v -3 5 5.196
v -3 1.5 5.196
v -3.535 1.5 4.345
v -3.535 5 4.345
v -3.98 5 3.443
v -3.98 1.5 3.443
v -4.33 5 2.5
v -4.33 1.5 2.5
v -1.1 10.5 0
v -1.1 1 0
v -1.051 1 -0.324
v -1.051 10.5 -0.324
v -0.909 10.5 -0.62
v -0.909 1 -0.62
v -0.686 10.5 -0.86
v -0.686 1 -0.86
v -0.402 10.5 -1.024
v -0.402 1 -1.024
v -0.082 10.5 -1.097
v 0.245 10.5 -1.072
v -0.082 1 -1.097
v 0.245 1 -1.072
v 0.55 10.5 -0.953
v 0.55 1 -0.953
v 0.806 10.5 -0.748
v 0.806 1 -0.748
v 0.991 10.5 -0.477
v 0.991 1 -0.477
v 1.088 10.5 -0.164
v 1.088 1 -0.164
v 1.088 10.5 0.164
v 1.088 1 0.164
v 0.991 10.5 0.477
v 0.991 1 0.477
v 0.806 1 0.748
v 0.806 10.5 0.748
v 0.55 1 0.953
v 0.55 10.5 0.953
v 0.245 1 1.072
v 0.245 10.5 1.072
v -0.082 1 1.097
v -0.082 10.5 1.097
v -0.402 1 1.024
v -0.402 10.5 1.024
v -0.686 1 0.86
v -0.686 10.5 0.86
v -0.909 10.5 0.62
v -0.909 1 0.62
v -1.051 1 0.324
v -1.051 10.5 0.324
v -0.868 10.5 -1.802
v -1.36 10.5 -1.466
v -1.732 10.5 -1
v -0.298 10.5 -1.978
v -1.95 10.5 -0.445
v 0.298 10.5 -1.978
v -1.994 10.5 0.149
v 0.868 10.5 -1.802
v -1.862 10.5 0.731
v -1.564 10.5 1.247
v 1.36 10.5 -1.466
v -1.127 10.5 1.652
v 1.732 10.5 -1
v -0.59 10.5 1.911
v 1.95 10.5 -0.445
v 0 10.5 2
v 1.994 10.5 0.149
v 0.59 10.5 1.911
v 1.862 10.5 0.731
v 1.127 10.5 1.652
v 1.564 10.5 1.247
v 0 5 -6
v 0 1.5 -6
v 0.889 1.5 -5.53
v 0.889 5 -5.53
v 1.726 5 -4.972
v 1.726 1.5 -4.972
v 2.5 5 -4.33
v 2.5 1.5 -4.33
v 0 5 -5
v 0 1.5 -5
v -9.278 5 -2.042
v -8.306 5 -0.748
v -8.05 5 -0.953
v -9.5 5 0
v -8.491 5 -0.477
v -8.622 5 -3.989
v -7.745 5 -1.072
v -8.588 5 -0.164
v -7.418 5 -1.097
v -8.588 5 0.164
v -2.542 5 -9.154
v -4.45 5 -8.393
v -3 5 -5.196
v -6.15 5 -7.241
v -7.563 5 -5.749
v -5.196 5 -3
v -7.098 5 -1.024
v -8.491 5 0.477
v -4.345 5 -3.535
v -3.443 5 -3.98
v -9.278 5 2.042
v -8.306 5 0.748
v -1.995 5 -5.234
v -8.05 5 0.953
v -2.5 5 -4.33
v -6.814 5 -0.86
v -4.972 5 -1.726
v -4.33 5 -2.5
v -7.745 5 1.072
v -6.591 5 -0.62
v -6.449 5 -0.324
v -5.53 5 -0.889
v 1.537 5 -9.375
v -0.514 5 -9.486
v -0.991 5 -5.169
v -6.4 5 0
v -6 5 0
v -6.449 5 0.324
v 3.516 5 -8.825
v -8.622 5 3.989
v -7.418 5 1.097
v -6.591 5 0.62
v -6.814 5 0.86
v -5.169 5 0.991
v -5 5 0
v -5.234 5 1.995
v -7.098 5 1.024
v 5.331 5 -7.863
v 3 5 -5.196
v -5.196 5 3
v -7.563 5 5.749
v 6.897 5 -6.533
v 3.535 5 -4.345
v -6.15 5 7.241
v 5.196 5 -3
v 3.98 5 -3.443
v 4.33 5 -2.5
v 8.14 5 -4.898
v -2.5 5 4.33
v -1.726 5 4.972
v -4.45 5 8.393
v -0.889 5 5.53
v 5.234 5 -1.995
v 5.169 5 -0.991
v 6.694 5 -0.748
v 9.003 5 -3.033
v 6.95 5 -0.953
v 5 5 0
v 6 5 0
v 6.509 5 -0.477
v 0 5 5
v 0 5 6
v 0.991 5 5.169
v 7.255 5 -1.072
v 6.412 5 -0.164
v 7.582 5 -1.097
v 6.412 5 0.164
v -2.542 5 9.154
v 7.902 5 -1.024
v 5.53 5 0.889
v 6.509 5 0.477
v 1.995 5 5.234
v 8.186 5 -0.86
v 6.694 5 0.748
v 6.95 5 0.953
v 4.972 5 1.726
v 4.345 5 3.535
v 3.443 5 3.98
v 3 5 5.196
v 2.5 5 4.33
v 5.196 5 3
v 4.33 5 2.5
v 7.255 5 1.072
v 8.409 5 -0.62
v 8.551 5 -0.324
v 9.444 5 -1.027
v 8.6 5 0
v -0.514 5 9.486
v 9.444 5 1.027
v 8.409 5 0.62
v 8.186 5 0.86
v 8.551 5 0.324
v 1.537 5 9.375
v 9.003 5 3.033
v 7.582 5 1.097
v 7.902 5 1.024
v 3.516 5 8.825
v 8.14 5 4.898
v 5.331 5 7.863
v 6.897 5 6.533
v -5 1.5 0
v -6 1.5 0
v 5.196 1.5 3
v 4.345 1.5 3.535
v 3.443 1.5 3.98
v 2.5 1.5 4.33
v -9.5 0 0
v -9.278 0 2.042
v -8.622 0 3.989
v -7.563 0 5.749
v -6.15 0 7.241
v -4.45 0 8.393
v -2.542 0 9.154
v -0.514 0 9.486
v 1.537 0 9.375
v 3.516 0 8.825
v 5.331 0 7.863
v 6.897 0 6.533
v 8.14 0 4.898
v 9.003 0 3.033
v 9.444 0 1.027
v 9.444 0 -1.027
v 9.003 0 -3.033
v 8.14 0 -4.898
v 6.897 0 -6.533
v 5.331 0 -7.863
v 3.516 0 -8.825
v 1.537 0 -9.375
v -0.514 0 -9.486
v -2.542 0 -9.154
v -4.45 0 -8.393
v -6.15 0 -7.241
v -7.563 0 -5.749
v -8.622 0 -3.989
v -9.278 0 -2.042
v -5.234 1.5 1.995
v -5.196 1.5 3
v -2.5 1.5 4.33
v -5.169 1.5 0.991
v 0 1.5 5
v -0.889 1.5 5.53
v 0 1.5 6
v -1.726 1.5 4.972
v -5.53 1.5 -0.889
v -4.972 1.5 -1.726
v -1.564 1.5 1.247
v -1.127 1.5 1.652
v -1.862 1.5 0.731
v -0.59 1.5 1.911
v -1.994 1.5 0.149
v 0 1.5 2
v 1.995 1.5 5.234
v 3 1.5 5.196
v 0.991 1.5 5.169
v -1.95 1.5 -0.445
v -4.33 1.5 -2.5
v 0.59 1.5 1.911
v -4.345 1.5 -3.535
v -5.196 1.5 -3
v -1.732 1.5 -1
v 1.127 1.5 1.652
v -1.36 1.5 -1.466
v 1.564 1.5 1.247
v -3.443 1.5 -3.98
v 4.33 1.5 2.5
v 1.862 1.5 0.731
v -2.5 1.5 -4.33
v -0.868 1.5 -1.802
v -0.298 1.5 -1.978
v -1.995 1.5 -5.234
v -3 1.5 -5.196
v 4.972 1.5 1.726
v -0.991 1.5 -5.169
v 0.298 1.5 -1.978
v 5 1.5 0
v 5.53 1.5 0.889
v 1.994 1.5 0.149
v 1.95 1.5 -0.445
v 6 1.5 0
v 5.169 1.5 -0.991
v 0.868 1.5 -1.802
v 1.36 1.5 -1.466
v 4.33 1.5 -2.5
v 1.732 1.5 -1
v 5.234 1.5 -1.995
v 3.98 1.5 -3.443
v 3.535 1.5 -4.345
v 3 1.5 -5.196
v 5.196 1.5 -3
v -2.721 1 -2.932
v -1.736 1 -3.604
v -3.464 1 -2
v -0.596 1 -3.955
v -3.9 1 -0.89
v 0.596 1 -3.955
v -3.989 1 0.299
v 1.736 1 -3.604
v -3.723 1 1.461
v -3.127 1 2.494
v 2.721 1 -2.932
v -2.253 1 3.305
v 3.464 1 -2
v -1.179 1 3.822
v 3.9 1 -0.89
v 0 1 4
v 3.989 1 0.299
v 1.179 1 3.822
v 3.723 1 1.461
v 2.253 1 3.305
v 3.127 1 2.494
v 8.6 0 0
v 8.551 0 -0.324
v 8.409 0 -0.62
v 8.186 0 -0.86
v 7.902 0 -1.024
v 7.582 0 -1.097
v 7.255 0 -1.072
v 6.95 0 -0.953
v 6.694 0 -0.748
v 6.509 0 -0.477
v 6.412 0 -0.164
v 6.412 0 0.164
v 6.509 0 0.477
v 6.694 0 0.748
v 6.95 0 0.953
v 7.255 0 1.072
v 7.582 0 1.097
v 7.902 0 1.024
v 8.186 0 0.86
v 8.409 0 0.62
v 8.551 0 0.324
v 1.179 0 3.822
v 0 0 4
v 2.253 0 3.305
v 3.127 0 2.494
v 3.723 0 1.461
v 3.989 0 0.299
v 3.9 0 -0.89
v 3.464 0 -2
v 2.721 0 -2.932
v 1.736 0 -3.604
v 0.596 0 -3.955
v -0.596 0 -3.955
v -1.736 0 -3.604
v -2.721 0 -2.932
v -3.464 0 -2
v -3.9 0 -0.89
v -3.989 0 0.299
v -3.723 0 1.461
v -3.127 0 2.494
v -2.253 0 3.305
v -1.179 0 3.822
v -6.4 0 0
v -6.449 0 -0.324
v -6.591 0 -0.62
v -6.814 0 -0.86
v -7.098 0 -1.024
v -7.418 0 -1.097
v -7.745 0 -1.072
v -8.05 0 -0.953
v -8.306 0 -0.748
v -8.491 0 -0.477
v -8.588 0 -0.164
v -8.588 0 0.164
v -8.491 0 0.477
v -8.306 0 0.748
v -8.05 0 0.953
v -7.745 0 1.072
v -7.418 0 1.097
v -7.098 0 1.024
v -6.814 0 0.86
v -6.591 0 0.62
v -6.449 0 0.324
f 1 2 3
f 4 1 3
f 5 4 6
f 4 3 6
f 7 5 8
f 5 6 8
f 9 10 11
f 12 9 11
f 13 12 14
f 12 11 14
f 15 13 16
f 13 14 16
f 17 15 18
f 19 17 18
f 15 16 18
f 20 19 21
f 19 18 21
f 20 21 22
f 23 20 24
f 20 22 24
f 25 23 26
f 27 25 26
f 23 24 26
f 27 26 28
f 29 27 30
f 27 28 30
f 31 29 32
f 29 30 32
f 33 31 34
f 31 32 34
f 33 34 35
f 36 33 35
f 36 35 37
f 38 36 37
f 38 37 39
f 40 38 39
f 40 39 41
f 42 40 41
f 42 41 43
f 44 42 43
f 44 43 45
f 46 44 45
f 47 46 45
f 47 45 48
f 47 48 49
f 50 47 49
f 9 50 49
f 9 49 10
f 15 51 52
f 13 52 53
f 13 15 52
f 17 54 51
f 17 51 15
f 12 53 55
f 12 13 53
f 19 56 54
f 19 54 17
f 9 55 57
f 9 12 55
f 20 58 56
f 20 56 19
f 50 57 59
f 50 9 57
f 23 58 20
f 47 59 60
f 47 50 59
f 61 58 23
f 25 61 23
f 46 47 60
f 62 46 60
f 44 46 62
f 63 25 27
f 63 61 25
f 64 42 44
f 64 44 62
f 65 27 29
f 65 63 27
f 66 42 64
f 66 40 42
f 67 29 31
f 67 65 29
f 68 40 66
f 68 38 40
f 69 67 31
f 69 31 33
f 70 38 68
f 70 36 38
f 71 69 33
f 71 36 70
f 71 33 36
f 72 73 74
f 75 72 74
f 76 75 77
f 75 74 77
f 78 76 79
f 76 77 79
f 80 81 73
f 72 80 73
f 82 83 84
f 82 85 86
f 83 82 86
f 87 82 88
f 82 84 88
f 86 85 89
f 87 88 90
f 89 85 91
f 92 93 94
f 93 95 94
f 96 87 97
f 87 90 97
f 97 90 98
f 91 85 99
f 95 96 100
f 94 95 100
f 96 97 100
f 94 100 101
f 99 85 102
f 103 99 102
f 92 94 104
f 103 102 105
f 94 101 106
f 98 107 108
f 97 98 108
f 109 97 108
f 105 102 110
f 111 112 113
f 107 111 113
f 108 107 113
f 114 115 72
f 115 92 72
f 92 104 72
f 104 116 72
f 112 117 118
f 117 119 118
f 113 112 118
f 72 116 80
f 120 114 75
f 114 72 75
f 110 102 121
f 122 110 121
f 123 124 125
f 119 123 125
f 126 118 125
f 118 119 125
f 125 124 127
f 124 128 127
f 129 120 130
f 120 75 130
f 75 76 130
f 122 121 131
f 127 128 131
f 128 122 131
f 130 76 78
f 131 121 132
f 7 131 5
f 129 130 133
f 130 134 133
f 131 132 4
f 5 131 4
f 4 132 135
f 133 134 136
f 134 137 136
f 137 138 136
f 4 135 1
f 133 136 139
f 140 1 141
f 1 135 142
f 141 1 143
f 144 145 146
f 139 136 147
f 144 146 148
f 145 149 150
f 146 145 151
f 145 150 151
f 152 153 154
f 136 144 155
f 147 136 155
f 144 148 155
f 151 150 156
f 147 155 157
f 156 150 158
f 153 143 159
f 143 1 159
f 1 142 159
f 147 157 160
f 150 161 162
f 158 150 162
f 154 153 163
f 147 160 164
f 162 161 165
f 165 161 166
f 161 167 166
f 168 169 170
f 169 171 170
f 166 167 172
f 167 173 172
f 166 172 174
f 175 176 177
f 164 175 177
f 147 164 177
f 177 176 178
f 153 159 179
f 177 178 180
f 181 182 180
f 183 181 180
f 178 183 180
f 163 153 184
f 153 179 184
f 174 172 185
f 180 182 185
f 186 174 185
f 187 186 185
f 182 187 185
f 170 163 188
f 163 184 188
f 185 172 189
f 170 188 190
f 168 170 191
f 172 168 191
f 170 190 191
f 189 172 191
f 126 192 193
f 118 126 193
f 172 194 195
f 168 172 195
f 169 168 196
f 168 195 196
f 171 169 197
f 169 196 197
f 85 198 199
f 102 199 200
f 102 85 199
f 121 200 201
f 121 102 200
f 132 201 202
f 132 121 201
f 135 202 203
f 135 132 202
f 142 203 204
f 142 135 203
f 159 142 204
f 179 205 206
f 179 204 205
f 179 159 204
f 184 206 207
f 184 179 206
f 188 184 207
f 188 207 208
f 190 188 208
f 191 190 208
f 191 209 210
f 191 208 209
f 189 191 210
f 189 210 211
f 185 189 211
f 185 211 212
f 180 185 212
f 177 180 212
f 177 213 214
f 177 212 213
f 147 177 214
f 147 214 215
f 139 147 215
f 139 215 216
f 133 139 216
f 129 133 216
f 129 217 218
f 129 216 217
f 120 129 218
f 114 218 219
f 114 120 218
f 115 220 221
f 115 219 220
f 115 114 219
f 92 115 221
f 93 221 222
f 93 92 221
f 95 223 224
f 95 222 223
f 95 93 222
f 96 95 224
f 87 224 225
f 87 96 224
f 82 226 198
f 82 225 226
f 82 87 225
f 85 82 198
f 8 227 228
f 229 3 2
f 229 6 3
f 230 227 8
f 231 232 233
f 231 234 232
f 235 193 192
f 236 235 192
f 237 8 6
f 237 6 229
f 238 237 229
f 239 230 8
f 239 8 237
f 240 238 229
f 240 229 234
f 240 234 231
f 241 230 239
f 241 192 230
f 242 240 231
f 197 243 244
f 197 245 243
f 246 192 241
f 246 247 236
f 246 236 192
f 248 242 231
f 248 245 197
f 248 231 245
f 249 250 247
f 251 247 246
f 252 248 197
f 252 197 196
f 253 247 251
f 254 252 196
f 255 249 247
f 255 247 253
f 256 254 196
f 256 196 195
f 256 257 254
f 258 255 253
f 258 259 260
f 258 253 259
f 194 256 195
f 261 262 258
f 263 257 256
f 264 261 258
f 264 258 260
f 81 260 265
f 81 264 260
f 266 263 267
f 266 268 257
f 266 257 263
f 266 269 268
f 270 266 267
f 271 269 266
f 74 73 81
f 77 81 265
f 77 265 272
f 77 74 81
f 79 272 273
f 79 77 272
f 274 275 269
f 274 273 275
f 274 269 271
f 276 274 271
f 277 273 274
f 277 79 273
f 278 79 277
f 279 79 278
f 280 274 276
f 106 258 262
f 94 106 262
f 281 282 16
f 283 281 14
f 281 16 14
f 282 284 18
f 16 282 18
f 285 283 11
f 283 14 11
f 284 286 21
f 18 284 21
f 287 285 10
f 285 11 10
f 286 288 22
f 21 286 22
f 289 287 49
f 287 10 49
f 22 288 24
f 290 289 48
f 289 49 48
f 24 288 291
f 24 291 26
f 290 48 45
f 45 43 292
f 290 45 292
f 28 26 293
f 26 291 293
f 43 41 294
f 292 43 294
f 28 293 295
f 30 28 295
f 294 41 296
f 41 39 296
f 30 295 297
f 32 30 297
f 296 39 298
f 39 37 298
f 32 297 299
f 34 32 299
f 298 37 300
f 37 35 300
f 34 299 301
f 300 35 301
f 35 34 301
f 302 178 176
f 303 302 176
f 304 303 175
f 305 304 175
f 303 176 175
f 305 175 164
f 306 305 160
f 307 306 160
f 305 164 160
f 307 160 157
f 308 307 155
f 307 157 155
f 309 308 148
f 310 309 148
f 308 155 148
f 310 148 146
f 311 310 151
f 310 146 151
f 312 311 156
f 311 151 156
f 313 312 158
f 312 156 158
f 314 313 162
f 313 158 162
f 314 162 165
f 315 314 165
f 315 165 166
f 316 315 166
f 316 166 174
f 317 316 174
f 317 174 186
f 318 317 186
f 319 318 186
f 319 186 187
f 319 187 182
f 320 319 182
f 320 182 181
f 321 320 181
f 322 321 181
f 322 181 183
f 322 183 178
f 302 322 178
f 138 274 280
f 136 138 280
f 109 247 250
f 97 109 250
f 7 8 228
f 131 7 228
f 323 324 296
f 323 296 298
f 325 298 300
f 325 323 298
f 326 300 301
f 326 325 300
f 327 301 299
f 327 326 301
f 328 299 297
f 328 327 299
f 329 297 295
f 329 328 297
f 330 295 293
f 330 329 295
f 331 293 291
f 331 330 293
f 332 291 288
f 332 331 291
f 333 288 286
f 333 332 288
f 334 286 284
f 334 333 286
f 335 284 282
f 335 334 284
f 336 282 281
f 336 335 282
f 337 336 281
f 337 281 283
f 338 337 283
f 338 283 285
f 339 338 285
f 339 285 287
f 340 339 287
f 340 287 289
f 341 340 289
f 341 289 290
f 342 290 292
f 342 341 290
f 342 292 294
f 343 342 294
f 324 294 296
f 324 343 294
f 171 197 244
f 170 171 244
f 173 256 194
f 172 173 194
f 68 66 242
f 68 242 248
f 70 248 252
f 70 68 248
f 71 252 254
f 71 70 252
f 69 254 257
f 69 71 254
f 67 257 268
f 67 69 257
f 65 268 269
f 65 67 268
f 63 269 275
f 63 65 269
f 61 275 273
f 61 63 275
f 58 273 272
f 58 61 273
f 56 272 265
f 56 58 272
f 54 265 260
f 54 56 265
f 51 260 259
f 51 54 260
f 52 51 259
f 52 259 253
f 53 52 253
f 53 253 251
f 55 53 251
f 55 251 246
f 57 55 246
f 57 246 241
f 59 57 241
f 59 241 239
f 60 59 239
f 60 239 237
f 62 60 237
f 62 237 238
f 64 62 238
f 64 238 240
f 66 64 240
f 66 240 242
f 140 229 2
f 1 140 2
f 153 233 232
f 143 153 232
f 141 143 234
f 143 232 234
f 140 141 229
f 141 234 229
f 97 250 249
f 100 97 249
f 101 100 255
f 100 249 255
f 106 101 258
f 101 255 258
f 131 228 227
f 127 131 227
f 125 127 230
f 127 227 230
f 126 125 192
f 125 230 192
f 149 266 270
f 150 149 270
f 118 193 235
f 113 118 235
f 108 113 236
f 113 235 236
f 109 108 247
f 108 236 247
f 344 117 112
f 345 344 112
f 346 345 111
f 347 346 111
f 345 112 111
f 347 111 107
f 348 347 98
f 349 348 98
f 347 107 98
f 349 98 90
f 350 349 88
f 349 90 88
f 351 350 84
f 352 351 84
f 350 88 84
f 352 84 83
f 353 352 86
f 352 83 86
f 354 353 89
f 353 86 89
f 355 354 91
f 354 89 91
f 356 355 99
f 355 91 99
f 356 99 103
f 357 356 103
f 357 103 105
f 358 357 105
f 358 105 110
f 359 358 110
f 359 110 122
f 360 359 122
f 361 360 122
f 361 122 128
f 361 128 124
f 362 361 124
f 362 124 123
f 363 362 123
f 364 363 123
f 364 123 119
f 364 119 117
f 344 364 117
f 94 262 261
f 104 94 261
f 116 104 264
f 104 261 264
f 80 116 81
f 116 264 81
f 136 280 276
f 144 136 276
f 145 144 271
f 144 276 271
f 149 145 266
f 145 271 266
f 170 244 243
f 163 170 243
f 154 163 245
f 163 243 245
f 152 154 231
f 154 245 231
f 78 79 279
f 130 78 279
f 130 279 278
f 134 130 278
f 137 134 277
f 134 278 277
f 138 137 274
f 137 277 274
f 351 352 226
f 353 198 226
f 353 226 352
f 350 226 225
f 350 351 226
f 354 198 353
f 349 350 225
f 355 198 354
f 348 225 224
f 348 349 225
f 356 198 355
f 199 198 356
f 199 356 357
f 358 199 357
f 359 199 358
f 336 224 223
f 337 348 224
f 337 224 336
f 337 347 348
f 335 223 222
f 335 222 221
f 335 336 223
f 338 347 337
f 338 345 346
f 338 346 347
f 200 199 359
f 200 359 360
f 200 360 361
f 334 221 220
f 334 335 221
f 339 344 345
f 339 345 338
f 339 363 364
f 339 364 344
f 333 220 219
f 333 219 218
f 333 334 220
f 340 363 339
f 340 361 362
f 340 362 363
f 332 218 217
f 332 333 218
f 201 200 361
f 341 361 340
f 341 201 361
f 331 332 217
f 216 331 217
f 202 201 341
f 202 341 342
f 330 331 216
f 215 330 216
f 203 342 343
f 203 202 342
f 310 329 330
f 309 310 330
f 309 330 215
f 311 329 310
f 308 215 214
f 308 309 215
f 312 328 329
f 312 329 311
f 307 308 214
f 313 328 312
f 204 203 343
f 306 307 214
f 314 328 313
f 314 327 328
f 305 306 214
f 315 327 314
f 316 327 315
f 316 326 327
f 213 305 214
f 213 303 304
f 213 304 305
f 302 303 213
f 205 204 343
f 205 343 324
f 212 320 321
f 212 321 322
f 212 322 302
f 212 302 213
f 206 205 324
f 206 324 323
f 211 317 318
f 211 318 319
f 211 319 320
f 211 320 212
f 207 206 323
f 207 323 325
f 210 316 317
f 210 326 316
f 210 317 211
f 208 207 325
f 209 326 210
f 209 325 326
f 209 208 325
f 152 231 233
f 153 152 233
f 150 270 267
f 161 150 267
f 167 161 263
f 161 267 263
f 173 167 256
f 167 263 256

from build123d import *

# Parameters (mm, degrees)
SIDE_PROFILE_RATCHETING_PULLEY_MASTERMOD_W = 7.5
SIDE_PROFILE_RATCHETING_PULLEY_MASTERMOD_H = 5
RATCHETING_START                           = 1.5
RATCHETING_PULLEY_MASTERMODEL_OUTLINE_R    = 6
RATCHETING_PULLEY_MASTERMODEL_OUTLINE_R_2  = 2
RATCHETING_PULLEY_MASTERMODEL_DEPTH        = 3.5
M2_CLEARANCE_HOLE2_D                       = 2.2
BOSS_EXTRUDE2_DEPTH                        = 5
BOSS_EXTRUDE1_START                        = 10.5
BOTTOM_PULLEY_RATCHETING_PULLEY_MASTERMO_R = 2
BOSS_EXTRUDE1_DEPTH                        = 10.5
M2_CLEARANCE_HOLE3_D                       = 2.2
BOTTOM_PULLEY_RATCHETING_PULLEY_MAST_2_R   = 4
CUT_EXTRUDE3_DEPTH                         = 1


# Read off the part's stored shape, not the designer's step: ratcheting pulley mastermodel
with BuildPart() as part:
    # side profile-ratcheting pulley mastermod → Revolve1 (revolve)
    with BuildSketch(Plane.XY, mode=Mode.PRIVATE) as revolve1_sk:
        with Locations((-5.75, 2.5)):
            Rectangle(SIDE_PROFILE_RATCHETING_PULLEY_MASTERMOD_W, SIDE_PROFILE_RATCHETING_PULLEY_MASTERMOD_H)
        with Locations((5.75, 2.5)):
            Rectangle(SIDE_PROFILE_RATCHETING_PULLEY_MASTERMOD_W, SIDE_PROFILE_RATCHETING_PULLEY_MASTERMOD_H)
    revolve(revolve1_sk.sketch.rotate(Axis((0, 0, 0), (0, 1, 0)), 180), axis=Axis((0, 0, 0), (0, 1, 0)))

    # ratcheting pulley mastermodel outline → ratcheting pulley mastermodel (cut)
    with BuildSketch(Plane(origin=(0, 0, 0), x_dir=(1, 0, 0), z_dir=(0, 1, 0)).offset(RATCHETING_START)):
        Circle(RATCHETING_PULLEY_MASTERMODEL_OUTLINE_R)
        Circle(RATCHETING_PULLEY_MASTERMODEL_OUTLINE_R_2, mode=Mode.SUBTRACT)
    extrude(amount=RATCHETING_PULLEY_MASTERMODEL_DEPTH, mode=Mode.SUBTRACT)

    # M2 Clearance Hole2 (through all)
    with Locations(Plane(origin=(0, 0, 0), x_dir=(-1, 0, 0), z_dir=(0, -1, 0))):
        with Locations((-7.5, 0), (7.5, 0)):
            Hole(M2_CLEARANCE_HOLE2_D / 2)

    # ratchet profile-ratcheting pulley master → Boss-Extrude2 (add)
    with BuildSketch(Plane(origin=(0, 0, 0), x_dir=(1, 0, 0), z_dir=(0, 1, 0))):
        with BuildLine():
            ThreePointArc((-3, 5.196152423), (-1.492401284, 5.214292716), (0, 5))
            Line((0, 5), (0, 6))
            ThreePointArc((0, 6), (-1.552914271, 5.795554958), (-3, 5.196152423))
        make_face()
        with BuildLine():
            ThreePointArc((0, 6), (1.314688934, 5.261910597), (2.5, 4.330127019))
            Line((2.5, 4.330127019), (3, 5.196152423))
            ThreePointArc((3, 5.196152423), (1.552914271, 5.795554958), (0, 6))
        make_face()
        with BuildLine():
            ThreePointArc((3, 5.196152423), (3.769509313, 3.899603782), (4.330127019, 2.5))
            Line((4.330127019, 2.5), (5.196152423, 3))
            ThreePointArc((5.196152423, 3), (4.242640687, 4.242640687), (3, 5.196152423))
        make_face()
        with BuildLine():
            ThreePointArc((5.196152423, 3), (5.214292716, 1.492401284), (5, 0))
            Line((5, 0), (6, 0))
            ThreePointArc((6, 0), (5.795554958, 1.552914271), (5.196152423, 3))
        make_face()
        with BuildLine():
            ThreePointArc((6, 0), (5.261910597, -1.314688934), (4.330127019, -2.5))
            Line((4.330127019, -2.5), (5.196152423, -3))
            ThreePointArc((5.196152423, -3), (5.795554958, -1.552914271), (6, 0))
        make_face()
        with BuildLine():
            ThreePointArc((5.196152423, -3), (3.899603782, -3.769509313), (2.5, -4.330127019))
            Line((2.5, -4.330127019), (3, -5.196152423))
            ThreePointArc((3, -5.196152423), (4.242640687, -4.242640687), (5.196152423, -3))
        make_face()
        with BuildLine():
            ThreePointArc((3, -5.196152423), (1.492401284, -5.214292716), (0, -5))
            Line((0, -5), (0, -6))
            ThreePointArc((0, -6), (1.552914271, -5.795554958), (3, -5.196152423))
        make_face()
        with BuildLine():
            ThreePointArc((0, -6), (-1.314688934, -5.261910597), (-2.5, -4.330127019))
            Line((-2.5, -4.330127019), (-3, -5.196152423))
            ThreePointArc((-3, -5.196152423), (-1.552914271, -5.795554958), (0, -6))
        make_face()
        with BuildLine():
            ThreePointArc((-3, -5.196152423), (-3.769509313, -3.899603782), (-4.330127019, -2.5))
            Line((-4.330127019, -2.5), (-5.196152423, -3))
            ThreePointArc((-5.196152423, -3), (-4.242640687, -4.242640687), (-3, -5.196152423))
        make_face()
        with BuildLine():
            ThreePointArc((-5.196152423, -3), (-5.214292716, -1.492401284), (-5, 0))
            Line((-5, 0), (-6, 0))
            ThreePointArc((-6, 0), (-5.795554958, -1.552914271), (-5.196152423, -3))
        make_face()
        with BuildLine():
            ThreePointArc((-6, 0), (-5.261910597, 1.314688934), (-4.330127019, 2.5))
            Line((-4.330127019, 2.5), (-5.196152423, 3))
            ThreePointArc((-5.196152423, 3), (-5.795554958, 1.552914271), (-6, 0))
        make_face()
        with BuildLine():
            ThreePointArc((-5.196152423, 3), (-3.899603782, 3.769509313), (-2.5, 4.330127019))
            Line((-2.5, 4.330127019), (-3, 5.196152423))
            ThreePointArc((-3, 5.196152423), (-4.242640687, 4.242640687), (-5.196152423, 3))
        make_face()
    extrude(amount=BOSS_EXTRUDE2_DEPTH)

    # bottom pulley-ratcheting pulley mastermo → Boss-Extrude1 (add)
    with BuildSketch(Plane(origin=(0, 0, 0), x_dir=(1, 0, 0), z_dir=(0, 1, 0)).offset(BOSS_EXTRUDE1_START)):
        with Locations(Location((0, 0, 0), (0, 0, 270))):
            Circle(BOTTOM_PULLEY_RATCHETING_PULLEY_MASTERMO_R)
    extrude(amount=-BOSS_EXTRUDE1_DEPTH)

    # M2 Clearance Hole3 (through all)
    with Locations(Plane(origin=(0, 10.5, 0), x_dir=(1, 0, 0), z_dir=(0, 1, 0))):
        with Locations((0, 0)):
            Hole(M2_CLEARANCE_HOLE3_D / 2)

    # bottom pulley-ratcheting pulley mast 2 → Cut-Extrude3 (cut)
    with BuildSketch(Plane(origin=(0, 0, 0), x_dir=(1, 0, 0), z_dir=(0, 1, 0))):
        with Locations(Location((0, 0, 0), (0, 0, 270))):
            Circle(BOTTOM_PULLEY_RATCHETING_PULLEY_MAST_2_R)
    extrude(amount=CUT_EXTRUDE3_DEPTH, mode=Mode.SUBTRACT)


solid = part.part
